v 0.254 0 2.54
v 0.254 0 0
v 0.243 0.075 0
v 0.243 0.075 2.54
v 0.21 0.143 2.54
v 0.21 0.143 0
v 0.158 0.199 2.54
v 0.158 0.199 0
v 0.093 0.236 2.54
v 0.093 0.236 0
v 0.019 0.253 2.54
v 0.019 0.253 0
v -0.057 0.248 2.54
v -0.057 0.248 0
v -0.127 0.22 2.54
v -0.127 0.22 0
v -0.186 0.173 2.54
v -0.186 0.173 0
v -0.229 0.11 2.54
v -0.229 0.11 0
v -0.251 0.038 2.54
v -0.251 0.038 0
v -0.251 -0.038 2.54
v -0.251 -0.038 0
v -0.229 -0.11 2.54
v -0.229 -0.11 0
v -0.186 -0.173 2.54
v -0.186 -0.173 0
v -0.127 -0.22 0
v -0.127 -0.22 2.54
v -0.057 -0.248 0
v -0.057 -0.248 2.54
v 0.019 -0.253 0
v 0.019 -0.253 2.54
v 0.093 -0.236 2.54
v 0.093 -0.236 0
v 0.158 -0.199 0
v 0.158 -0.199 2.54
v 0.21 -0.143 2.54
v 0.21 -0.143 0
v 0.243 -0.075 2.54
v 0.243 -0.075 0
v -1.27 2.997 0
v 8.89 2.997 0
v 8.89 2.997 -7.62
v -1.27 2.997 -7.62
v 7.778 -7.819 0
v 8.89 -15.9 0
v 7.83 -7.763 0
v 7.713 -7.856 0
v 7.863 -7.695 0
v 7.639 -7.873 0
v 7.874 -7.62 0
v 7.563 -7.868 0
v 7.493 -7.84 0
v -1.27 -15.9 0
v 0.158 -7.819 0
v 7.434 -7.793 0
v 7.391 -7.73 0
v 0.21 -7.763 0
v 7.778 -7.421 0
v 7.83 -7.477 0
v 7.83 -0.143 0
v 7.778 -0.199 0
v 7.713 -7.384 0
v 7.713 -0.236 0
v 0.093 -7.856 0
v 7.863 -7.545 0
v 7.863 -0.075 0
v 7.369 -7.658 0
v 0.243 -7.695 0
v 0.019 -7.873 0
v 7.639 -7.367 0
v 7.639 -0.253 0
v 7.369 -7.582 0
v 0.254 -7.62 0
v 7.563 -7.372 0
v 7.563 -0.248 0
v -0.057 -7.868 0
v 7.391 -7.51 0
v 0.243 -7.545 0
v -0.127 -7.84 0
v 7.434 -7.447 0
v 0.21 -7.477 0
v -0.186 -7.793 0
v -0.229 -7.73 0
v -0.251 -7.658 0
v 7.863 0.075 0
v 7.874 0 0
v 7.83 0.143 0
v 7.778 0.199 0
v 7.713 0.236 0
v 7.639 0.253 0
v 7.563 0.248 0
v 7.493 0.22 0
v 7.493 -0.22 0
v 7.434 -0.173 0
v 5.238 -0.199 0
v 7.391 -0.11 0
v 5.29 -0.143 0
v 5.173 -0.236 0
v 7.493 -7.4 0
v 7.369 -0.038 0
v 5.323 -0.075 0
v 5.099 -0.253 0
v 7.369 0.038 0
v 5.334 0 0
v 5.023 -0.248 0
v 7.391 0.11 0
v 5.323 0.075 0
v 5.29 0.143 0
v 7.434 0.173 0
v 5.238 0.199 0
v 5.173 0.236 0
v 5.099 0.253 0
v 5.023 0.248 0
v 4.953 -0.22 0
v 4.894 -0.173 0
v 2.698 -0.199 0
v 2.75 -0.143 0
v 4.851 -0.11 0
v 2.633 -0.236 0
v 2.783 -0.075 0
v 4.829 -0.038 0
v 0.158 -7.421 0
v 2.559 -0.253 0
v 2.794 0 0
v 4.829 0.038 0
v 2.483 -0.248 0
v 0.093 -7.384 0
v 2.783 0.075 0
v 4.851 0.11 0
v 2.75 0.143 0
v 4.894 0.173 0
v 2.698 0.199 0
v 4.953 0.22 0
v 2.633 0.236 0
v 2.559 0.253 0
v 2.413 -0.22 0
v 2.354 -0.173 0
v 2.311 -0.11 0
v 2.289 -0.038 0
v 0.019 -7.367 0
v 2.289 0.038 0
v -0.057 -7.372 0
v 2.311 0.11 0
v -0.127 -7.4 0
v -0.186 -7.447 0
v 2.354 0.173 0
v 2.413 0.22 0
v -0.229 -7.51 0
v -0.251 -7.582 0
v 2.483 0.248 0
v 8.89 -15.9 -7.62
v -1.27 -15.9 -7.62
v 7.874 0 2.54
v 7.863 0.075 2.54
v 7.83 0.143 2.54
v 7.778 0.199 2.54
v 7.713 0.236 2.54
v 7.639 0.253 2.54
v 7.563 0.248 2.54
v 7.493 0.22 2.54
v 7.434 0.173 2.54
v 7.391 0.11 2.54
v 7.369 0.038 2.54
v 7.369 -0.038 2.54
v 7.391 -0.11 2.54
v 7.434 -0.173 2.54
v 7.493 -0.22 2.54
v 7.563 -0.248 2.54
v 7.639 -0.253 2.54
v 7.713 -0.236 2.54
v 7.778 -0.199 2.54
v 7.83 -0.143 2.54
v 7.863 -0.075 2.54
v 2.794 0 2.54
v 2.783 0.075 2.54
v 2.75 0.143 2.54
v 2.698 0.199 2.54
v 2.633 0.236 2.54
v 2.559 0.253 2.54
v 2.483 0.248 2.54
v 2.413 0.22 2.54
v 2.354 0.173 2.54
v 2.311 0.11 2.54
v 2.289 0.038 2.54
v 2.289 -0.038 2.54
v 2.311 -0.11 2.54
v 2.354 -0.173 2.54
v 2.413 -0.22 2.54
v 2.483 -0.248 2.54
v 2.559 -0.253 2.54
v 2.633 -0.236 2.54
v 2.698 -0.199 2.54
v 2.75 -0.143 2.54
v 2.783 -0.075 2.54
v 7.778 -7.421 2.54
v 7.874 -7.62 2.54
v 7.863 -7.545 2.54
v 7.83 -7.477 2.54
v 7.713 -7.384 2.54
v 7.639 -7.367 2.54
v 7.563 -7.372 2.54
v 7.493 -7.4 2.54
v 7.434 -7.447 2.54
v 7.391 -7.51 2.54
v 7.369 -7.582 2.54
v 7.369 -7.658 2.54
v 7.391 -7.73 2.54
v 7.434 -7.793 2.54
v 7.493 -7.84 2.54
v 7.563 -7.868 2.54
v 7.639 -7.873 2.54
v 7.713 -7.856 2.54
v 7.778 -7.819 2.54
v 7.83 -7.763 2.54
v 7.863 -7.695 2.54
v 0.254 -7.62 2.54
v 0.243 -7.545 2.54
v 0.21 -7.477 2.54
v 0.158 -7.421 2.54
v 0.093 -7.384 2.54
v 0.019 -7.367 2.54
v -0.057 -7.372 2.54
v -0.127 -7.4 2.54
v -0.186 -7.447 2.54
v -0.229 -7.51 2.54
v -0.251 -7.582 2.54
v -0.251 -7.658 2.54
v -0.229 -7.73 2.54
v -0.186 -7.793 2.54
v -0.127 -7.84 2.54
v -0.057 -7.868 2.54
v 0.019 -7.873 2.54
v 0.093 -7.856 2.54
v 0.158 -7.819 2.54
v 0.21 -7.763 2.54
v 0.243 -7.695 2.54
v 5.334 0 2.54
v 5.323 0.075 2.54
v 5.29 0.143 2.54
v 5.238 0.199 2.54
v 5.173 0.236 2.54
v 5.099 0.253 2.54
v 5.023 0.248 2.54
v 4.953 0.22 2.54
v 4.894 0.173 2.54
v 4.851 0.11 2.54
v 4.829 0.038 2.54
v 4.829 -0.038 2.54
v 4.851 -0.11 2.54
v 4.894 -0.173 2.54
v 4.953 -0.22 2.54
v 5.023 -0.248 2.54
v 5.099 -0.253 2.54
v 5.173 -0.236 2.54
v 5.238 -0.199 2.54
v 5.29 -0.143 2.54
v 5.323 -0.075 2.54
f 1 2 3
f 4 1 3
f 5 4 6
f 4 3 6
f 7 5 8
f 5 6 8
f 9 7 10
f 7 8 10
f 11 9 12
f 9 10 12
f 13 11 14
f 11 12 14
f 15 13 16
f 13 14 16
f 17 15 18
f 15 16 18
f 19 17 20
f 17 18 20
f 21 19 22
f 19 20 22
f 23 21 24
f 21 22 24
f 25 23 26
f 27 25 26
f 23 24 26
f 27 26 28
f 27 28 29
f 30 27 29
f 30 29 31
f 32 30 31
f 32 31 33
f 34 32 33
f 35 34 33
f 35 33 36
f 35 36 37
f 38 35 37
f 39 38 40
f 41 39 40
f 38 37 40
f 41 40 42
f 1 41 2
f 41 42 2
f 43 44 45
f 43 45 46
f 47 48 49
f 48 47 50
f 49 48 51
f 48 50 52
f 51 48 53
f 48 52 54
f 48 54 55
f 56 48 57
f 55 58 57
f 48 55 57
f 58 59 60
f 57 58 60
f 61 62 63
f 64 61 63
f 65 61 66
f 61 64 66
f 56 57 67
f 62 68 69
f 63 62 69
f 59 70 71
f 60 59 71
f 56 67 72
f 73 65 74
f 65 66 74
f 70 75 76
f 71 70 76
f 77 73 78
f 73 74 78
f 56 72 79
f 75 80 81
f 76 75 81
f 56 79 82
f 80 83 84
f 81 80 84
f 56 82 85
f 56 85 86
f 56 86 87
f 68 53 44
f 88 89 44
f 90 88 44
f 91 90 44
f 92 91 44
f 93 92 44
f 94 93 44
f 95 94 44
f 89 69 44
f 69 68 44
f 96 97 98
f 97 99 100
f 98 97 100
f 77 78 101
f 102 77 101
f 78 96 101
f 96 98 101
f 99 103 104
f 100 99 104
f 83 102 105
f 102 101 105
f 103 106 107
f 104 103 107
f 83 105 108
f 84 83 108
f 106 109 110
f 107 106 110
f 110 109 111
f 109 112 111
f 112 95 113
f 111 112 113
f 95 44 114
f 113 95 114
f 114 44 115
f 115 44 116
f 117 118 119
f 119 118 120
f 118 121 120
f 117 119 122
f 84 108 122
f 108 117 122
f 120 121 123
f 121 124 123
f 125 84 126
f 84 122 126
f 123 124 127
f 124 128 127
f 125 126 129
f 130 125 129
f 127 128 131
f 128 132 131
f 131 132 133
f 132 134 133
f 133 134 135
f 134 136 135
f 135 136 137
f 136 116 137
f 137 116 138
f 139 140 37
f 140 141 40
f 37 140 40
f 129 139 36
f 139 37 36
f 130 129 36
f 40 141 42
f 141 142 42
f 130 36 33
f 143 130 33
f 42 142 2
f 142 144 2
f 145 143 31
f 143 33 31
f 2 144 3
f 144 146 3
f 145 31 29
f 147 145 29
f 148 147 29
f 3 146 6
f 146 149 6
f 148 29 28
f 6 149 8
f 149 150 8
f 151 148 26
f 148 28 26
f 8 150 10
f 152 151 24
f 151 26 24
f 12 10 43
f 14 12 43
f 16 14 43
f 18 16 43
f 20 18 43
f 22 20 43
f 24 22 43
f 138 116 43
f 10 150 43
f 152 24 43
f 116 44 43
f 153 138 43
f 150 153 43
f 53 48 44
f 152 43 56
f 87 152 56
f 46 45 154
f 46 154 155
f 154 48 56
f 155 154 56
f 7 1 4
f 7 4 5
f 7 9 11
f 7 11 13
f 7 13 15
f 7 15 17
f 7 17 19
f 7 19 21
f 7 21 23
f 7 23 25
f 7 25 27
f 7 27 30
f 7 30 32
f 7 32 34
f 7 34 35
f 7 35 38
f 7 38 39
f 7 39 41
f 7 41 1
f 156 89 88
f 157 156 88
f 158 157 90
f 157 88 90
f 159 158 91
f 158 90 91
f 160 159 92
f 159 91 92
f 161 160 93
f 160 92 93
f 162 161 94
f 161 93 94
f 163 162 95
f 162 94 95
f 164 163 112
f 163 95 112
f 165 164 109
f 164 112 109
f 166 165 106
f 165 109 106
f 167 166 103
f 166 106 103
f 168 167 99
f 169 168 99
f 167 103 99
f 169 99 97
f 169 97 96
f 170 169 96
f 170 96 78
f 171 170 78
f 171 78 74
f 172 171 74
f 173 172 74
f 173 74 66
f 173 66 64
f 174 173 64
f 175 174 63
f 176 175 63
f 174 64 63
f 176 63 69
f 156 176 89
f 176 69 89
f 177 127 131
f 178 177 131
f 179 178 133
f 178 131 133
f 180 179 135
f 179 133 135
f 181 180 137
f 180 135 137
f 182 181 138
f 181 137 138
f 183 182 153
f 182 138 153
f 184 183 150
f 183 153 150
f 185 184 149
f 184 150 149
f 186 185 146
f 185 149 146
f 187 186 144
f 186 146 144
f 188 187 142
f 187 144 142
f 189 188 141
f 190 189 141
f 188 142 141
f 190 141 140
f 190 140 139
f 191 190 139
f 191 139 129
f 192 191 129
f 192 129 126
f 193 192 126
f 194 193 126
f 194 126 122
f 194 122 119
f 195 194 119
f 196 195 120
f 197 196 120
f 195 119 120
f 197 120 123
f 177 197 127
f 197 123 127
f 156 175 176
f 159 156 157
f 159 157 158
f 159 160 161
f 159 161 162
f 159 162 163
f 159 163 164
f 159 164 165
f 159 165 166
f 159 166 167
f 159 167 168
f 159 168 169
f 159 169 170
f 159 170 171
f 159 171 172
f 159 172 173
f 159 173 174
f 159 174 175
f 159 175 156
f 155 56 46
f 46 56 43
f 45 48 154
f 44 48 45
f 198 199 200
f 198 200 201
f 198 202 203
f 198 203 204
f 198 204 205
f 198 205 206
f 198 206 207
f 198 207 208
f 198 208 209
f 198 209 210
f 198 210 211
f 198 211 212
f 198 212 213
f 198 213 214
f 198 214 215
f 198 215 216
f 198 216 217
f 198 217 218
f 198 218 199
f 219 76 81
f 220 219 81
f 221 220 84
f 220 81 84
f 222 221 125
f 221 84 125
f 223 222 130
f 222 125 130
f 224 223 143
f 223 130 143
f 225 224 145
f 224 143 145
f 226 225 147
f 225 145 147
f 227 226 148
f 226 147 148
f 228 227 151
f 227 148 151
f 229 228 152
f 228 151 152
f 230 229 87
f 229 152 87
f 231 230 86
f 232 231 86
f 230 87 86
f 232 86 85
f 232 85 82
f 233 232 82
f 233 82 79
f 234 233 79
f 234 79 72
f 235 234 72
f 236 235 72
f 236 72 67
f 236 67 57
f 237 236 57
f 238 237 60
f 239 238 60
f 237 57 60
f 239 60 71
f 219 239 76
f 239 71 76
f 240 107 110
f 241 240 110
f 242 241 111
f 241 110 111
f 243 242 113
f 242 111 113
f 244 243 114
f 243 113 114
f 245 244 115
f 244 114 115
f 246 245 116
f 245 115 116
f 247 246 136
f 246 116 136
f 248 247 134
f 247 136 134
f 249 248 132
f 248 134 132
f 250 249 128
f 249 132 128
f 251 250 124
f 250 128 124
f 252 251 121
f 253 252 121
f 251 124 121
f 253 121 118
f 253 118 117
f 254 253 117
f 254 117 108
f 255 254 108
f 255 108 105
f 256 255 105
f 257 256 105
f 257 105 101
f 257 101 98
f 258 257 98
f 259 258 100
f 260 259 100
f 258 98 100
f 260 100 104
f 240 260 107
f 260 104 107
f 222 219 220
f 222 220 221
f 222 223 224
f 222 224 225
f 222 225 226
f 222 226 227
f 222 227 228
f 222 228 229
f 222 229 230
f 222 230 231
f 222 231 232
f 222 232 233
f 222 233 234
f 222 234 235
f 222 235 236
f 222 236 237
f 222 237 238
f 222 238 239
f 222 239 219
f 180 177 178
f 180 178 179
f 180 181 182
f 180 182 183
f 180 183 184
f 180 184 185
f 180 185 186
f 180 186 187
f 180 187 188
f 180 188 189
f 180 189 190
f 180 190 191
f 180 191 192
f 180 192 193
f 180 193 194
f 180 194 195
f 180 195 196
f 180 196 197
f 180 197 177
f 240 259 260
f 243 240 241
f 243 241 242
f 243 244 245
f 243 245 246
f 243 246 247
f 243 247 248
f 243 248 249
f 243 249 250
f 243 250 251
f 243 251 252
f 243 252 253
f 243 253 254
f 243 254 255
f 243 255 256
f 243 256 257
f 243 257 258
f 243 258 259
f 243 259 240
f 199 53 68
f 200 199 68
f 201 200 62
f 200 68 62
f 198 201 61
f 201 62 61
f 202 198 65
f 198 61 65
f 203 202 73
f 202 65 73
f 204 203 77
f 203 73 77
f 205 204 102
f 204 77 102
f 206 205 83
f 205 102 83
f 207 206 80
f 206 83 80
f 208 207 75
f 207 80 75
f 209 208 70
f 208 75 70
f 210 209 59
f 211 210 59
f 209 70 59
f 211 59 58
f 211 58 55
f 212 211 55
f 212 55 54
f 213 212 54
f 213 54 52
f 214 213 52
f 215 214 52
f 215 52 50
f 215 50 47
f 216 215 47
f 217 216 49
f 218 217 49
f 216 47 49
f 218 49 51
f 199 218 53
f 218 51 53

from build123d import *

# Parameters (mm, degrees)
SKETCH1_R        = 0.254
EXTRUDE1_DEPTH   = 2.54
EXTRUDE1_2_DEPTH = 2.54
EXTRUDE1_3_DEPTH = 2.54
EXTRUDE1_4_DEPTH = 2.54
EXTRUDE1_5_DEPTH = 2.54
EXTRUDE1_6_DEPTH = 2.54
SKETCH2_W        = 10.16
SKETCH2_H        = 18.8976
EXTRUDE2_DEPTH   = 7.62


with BuildPart() as part:
    # Sketch1 → Extrude1 (new body)
    with BuildSketch(Plane.XY):
        Circle(SKETCH1_R)
    extrude(amount=EXTRUDE1_DEPTH)



with BuildPart() as body_2:
    # Sketch1 → Extrude1 2 (new body)
    with BuildSketch(Plane.XY):
        with Locations((2.54, 0)):
            Circle(SKETCH1_R)
    extrude(amount=EXTRUDE1_2_DEPTH)


with BuildPart() as body_3:
    # Sketch1 → Extrude1 3 (new body)
    with BuildSketch(Plane.XY):
        with Locations((5.08, 0)):
            Circle(SKETCH1_R)
    extrude(amount=EXTRUDE1_3_DEPTH)


with BuildPart() as body_4:
    # Sketch1 → Extrude1 4 (new body)
    with BuildSketch(Plane.XY):
        with Locations((7.62, 0)):
            Circle(SKETCH1_R)
    extrude(amount=EXTRUDE1_4_DEPTH)


with BuildPart() as body_5:
    # Sketch1 → Extrude1 5 (new body)
    with BuildSketch(Plane.XY):
        with Locations((0, -7.62)):
            Circle(SKETCH1_R)
    extrude(amount=EXTRUDE1_5_DEPTH)


with BuildPart() as body_6:
    # Sketch1 → Extrude1 6 (new body)
    with BuildSketch(Plane.XY):
        with Locations((7.62, -7.62)):
            Circle(SKETCH1_R)
    extrude(amount=EXTRUDE1_6_DEPTH)


with BuildPart() as part_1:
    add(part.part)

    add(body_2.part)  # Extrude2 merges body 2

    add(body_3.part)  # Extrude2 merges body 3

    add(body_4.part)  # Extrude2 merges body 4

    add(body_5.part)  # Extrude2 merges body 5

    add(body_6.part)  # Extrude2 merges body 6
    # Sketch2 → Extrude2 (add)
    with BuildSketch(Plane(origin=(0, 0, 0), x_dir=(-1, 0, 0), z_dir=(0, 0, -1))):
        with Locations((-3.81, -6.4516)):
            Rectangle(SKETCH2_W, SKETCH2_H)
    extrude(amount=EXTRUDE2_DEPTH)


solid = part_1.part
